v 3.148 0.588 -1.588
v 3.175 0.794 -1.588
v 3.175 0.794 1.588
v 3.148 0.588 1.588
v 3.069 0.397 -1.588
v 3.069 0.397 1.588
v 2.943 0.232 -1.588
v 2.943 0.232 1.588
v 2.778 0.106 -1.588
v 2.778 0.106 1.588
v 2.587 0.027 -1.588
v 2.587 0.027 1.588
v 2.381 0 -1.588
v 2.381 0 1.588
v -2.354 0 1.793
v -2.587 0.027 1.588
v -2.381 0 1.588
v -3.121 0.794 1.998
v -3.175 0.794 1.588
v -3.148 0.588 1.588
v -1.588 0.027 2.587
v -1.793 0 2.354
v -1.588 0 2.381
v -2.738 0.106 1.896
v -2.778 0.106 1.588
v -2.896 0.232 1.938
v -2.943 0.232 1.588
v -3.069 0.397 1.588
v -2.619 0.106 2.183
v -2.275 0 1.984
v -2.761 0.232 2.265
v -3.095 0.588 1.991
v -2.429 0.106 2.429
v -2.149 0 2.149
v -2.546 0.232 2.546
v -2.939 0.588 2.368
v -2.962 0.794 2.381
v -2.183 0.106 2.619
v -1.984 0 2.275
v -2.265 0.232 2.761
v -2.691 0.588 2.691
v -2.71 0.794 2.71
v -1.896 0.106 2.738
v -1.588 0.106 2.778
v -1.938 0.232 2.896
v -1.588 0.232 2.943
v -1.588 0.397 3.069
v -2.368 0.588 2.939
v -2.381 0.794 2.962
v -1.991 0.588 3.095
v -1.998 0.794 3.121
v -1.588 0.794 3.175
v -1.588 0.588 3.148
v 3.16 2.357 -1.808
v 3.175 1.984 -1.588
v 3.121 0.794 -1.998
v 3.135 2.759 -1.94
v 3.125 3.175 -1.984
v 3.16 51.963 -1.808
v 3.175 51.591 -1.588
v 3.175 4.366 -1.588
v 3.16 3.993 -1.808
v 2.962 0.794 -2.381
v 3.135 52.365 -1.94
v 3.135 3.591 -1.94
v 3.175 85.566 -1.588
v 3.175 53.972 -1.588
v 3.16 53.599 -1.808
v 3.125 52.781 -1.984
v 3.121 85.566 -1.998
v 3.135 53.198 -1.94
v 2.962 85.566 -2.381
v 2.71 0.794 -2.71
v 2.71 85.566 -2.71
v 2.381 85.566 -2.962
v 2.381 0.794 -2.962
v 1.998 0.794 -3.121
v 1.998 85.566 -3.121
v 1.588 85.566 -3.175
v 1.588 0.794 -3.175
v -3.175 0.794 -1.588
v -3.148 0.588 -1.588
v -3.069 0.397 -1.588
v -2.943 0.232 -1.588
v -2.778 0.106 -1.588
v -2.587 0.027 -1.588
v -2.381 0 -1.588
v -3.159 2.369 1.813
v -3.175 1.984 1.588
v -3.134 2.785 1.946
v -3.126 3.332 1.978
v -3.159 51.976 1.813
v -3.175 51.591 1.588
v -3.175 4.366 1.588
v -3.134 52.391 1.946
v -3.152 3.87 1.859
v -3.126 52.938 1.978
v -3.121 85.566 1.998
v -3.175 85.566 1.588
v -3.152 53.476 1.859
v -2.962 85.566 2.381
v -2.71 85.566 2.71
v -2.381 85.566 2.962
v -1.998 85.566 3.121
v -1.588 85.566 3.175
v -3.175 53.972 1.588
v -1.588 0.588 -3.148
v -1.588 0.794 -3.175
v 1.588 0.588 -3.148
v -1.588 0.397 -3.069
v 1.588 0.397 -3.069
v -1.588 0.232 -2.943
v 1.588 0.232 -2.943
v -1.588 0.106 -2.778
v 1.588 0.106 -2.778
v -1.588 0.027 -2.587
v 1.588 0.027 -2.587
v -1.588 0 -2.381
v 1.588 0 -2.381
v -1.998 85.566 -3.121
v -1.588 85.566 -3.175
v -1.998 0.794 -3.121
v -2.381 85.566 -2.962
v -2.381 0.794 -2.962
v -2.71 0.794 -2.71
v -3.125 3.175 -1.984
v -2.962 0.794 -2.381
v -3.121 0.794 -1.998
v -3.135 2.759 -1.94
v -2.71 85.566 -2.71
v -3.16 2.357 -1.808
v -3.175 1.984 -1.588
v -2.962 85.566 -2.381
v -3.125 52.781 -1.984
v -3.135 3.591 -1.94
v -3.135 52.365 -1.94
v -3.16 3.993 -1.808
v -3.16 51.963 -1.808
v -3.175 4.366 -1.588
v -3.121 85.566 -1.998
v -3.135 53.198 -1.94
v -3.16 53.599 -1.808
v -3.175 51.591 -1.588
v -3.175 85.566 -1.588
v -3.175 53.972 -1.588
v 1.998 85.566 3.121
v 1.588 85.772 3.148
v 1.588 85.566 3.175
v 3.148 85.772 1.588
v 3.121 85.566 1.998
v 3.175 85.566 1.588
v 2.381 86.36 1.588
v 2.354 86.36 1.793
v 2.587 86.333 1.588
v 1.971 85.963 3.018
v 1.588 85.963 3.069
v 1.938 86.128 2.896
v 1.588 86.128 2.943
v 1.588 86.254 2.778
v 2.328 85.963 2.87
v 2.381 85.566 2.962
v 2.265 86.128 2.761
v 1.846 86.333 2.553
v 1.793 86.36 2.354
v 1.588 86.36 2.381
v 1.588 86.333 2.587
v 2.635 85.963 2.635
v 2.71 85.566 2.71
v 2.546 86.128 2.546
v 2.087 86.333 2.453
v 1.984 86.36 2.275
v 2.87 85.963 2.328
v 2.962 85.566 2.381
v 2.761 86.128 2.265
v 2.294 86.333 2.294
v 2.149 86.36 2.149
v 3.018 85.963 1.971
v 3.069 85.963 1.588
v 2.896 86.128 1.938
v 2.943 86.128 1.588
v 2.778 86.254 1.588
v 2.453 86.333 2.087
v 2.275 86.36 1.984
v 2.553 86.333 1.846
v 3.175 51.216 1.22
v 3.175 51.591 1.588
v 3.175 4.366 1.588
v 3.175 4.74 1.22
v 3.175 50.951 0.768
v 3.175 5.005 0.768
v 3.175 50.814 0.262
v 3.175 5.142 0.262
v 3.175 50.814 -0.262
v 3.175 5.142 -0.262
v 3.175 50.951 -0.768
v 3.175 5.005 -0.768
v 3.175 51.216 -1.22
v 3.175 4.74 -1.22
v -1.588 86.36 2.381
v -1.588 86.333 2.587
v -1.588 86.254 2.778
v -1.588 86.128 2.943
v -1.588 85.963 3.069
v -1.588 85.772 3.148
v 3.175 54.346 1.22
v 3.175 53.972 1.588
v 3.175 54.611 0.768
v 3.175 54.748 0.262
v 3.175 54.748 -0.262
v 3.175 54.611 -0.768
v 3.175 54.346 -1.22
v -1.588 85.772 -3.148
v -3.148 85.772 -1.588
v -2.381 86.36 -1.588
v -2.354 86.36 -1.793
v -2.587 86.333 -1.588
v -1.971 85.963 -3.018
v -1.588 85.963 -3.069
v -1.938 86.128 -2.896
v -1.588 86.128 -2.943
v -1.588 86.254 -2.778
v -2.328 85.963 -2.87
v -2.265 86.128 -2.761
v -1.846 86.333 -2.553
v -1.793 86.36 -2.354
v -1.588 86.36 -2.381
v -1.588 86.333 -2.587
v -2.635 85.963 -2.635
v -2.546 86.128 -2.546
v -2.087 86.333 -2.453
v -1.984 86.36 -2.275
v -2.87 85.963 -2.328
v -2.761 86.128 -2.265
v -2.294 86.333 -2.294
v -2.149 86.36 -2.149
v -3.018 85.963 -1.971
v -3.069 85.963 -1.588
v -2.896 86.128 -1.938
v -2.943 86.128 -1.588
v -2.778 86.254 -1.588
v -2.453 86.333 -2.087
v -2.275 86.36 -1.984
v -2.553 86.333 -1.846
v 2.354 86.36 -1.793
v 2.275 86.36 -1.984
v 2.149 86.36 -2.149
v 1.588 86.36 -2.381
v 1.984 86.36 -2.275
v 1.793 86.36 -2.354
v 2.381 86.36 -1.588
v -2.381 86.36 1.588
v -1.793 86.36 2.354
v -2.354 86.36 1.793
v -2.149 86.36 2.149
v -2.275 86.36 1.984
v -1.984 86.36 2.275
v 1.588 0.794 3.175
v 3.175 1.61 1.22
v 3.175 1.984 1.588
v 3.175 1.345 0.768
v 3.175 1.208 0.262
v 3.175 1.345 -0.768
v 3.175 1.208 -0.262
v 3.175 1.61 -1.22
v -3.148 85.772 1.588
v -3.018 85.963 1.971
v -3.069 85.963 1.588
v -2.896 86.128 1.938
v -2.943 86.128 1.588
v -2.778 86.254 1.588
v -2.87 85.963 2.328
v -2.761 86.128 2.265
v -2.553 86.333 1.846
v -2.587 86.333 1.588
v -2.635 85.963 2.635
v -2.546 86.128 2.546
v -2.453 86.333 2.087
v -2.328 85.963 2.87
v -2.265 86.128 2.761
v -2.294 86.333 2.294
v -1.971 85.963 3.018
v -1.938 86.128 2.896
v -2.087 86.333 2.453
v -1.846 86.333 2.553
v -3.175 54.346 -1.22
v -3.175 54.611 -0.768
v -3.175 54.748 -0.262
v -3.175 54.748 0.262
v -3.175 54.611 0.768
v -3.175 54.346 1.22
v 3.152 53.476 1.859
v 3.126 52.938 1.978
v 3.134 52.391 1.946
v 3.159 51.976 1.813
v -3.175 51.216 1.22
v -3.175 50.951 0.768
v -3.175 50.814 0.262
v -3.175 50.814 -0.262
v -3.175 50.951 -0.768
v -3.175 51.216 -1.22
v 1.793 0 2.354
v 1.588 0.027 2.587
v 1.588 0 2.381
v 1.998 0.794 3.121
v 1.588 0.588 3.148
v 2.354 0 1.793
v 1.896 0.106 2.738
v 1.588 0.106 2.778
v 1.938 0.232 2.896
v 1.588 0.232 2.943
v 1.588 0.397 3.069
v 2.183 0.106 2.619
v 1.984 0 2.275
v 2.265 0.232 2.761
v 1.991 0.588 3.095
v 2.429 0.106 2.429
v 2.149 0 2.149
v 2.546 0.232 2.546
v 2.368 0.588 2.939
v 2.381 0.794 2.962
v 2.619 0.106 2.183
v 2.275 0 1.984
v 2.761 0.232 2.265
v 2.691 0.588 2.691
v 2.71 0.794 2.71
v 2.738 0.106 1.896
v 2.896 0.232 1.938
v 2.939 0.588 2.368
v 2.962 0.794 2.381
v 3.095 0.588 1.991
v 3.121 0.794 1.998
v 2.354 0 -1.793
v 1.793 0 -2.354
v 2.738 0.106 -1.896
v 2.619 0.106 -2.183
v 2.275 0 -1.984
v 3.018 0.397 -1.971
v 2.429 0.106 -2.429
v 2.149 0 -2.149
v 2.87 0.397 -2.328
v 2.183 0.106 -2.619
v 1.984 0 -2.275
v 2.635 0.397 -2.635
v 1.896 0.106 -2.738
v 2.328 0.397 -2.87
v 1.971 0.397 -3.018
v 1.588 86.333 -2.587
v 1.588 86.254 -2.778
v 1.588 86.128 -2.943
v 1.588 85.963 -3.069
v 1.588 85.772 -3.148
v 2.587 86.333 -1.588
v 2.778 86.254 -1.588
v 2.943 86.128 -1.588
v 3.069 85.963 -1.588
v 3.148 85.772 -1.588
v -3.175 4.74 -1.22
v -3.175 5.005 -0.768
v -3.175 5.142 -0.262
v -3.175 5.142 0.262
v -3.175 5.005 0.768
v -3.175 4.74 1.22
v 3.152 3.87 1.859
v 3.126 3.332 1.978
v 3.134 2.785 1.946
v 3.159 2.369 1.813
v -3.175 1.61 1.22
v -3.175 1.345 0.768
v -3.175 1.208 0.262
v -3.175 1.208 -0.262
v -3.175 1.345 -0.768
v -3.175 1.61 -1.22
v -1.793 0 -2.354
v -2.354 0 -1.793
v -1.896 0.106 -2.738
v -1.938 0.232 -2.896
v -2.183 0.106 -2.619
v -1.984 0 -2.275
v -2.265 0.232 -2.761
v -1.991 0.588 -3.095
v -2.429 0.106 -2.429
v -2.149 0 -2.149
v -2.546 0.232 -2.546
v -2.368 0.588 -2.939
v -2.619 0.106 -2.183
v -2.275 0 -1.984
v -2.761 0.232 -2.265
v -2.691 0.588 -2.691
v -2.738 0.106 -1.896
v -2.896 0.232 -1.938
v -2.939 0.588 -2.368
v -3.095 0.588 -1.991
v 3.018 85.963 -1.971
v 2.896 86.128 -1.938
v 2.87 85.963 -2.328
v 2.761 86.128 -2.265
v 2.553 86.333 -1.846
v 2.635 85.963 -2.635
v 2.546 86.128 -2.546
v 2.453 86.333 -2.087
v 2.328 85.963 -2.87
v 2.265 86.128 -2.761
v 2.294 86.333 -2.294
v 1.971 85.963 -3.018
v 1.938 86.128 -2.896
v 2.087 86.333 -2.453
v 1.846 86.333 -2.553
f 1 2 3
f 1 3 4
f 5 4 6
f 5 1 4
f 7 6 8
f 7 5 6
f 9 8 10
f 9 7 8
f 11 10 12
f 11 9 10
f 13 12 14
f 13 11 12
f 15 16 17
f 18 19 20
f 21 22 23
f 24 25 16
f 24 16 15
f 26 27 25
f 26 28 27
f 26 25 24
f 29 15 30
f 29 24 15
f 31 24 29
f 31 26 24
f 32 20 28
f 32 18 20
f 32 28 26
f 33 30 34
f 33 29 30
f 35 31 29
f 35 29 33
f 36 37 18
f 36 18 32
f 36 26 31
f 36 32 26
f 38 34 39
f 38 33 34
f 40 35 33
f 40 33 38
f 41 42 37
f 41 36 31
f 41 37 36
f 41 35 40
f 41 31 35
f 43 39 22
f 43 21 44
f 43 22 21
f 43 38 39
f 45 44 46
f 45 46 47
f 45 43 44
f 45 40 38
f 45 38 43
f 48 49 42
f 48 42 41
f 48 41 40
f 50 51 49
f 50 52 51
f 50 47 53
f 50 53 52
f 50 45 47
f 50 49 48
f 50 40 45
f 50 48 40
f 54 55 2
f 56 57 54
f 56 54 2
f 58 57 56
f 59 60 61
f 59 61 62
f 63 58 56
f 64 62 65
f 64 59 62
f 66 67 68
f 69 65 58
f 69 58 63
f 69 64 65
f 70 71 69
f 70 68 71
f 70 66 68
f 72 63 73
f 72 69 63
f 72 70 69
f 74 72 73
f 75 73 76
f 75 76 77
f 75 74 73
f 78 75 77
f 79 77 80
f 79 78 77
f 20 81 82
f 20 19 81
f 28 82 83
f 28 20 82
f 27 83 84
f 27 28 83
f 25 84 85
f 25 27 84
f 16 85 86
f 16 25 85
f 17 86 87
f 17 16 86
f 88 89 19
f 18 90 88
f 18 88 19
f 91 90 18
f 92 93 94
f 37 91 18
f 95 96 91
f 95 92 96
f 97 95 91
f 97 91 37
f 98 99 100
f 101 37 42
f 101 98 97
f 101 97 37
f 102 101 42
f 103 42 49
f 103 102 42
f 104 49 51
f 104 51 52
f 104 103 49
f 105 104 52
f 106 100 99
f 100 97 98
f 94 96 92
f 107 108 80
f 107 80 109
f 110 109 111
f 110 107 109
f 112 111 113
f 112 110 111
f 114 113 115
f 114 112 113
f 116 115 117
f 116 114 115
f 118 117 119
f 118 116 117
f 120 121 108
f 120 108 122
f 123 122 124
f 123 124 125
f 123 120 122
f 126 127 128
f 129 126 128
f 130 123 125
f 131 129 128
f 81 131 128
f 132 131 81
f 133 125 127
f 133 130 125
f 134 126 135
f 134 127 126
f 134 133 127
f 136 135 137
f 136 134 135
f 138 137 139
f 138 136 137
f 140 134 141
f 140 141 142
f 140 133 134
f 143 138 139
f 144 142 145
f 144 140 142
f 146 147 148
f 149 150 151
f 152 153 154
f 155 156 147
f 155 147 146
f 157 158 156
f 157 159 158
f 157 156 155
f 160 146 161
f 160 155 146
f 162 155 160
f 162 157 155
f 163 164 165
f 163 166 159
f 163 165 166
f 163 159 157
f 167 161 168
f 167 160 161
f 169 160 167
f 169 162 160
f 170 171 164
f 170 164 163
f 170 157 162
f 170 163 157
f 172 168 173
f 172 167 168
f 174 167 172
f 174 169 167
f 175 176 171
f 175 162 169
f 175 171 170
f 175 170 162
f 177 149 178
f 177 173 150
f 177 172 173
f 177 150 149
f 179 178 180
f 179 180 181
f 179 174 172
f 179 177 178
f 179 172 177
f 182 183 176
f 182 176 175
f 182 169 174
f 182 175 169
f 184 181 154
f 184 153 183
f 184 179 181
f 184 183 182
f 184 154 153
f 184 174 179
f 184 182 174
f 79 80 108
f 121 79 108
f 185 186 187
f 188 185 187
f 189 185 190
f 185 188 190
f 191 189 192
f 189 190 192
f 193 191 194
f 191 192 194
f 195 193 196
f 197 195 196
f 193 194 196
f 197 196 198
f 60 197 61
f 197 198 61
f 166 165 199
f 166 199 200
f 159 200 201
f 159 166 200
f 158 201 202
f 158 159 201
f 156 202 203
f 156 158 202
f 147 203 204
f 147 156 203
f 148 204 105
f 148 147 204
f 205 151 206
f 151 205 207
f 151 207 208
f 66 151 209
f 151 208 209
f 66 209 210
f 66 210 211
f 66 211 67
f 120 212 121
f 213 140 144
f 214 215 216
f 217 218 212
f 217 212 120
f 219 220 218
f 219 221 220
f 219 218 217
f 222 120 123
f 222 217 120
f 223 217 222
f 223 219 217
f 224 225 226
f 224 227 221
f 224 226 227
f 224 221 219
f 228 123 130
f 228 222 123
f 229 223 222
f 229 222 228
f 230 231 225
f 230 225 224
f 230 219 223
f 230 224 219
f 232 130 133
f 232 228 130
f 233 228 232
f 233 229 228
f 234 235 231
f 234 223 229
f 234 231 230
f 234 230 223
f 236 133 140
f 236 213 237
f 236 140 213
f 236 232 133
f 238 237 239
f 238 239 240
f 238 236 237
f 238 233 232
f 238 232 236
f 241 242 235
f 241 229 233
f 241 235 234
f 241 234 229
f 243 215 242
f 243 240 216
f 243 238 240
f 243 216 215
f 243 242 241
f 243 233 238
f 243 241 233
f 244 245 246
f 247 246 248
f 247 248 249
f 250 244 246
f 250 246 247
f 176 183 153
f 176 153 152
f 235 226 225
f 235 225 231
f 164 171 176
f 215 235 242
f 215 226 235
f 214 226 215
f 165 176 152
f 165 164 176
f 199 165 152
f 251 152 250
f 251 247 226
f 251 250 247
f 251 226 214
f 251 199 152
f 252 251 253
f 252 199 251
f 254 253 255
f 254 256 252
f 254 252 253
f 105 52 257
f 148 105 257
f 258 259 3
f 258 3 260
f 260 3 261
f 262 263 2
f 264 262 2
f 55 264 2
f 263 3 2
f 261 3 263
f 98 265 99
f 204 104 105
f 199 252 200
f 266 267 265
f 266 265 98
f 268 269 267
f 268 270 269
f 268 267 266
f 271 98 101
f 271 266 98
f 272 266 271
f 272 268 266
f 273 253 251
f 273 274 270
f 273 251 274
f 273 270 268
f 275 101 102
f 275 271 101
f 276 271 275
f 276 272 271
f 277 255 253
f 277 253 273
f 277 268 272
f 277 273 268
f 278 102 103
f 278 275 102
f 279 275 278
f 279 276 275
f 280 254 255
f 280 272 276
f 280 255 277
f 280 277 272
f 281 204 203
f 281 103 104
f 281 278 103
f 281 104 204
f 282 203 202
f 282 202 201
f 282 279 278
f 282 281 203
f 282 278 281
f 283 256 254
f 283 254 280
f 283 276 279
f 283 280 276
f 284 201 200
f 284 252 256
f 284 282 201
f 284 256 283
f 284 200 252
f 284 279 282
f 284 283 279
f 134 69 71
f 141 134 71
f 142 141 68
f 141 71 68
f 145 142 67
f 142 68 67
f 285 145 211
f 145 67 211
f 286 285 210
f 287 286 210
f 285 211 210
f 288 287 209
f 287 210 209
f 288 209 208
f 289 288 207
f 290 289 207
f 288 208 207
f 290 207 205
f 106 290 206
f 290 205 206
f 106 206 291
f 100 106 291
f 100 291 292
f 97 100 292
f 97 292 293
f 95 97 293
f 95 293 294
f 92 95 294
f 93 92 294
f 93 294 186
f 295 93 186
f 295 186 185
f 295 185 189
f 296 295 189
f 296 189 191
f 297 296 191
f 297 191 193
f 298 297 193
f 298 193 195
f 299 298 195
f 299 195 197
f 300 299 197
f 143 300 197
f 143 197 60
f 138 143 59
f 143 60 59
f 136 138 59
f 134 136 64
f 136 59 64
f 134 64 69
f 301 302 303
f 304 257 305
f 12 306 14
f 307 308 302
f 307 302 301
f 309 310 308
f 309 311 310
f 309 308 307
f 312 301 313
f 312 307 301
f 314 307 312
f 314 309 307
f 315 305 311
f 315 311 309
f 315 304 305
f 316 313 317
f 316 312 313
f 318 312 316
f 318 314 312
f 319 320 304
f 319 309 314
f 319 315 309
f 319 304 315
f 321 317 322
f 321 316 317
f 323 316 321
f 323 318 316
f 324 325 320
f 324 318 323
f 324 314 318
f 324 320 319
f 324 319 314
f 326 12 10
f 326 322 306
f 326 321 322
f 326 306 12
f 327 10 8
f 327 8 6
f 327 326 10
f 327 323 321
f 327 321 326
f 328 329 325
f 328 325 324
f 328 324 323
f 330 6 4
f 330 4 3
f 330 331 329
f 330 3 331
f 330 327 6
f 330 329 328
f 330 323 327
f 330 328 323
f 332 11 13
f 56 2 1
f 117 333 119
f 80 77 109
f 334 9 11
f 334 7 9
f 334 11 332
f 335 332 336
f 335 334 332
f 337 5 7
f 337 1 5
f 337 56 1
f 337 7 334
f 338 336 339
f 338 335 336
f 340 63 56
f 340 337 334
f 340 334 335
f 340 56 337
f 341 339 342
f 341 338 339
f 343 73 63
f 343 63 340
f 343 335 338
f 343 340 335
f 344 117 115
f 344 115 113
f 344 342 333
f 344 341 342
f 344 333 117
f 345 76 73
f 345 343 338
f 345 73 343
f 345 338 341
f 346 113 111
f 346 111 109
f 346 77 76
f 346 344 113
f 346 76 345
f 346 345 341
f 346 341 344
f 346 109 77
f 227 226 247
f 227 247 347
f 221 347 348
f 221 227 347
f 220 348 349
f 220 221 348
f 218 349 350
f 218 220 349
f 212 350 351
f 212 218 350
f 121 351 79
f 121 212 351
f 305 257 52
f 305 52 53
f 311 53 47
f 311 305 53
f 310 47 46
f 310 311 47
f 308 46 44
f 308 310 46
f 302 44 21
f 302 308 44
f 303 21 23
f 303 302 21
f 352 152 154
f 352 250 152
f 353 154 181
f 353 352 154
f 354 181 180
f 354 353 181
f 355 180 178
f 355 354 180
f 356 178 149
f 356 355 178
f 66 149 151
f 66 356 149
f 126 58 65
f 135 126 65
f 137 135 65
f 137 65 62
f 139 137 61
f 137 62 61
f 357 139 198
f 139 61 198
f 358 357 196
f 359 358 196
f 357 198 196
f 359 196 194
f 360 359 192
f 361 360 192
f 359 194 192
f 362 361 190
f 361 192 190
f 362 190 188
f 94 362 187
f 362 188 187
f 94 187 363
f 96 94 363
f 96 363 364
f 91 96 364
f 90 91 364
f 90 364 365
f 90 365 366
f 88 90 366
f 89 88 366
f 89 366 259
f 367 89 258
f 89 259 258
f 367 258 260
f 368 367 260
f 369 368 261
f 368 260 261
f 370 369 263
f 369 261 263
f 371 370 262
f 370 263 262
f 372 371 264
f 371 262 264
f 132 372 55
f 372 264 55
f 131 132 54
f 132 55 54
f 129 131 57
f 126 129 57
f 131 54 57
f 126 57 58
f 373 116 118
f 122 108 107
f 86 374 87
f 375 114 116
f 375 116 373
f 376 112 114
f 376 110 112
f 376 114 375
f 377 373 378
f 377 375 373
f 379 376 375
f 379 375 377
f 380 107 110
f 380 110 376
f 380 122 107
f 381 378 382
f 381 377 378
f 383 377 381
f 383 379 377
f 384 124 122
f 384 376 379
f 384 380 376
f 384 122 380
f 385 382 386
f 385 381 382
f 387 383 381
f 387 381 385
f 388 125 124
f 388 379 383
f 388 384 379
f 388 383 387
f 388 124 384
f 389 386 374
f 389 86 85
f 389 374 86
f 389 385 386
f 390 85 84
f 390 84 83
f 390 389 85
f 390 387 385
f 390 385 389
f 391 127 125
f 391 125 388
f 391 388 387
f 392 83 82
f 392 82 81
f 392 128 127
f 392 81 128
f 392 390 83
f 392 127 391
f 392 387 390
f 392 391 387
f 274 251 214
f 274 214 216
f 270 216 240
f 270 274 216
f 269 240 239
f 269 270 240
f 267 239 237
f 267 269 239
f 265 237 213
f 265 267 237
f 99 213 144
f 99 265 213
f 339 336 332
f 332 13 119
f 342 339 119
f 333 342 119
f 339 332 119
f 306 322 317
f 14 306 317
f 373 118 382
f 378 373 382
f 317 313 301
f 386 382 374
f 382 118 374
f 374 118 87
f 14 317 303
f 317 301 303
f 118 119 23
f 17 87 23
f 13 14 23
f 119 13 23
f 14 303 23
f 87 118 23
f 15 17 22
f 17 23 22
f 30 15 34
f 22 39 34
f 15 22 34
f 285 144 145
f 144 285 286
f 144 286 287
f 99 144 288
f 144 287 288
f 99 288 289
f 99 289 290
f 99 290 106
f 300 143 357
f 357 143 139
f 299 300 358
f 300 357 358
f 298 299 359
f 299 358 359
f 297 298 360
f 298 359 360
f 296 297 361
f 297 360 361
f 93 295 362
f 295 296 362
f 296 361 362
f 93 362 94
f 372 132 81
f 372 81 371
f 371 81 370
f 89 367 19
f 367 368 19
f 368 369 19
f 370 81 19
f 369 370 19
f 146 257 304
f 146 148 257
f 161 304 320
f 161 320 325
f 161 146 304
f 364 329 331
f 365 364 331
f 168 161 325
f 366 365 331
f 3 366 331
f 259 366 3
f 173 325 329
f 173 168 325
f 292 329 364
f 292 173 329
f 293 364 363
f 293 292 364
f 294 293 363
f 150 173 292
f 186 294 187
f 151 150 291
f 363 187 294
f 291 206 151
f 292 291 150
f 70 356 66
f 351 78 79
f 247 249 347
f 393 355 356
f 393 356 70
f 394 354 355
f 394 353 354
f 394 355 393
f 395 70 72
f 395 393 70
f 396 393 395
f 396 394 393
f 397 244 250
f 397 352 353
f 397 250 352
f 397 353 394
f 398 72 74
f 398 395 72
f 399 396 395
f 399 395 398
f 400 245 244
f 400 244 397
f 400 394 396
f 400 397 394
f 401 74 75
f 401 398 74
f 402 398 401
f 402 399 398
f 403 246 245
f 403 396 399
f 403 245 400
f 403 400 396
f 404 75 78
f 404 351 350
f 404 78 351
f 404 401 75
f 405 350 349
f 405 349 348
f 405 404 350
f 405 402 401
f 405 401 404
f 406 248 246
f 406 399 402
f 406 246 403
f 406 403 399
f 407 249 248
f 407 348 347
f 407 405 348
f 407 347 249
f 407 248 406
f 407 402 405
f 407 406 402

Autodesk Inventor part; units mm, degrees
ref_plane "YZ Plane" through (0, 0, 0) normal (1, 0, 0) x (0, 1, 0)
ref_plane "XZ Plane" through (0, 0, 0) normal (0, 1, 0) x (-1, 0, 0)
ref_plane "XY Plane" through (0, 0, 0) normal (0, 0, 1) x (1, 0, 0)
sketch "Sketch1" plane through (0, 0, 0) normal (0, 1, 0) x (-1, 0, 0)
  line L0 (-3.175, -3.175) -> (3.175, -3.175)
  line L1 (3.175, -3.175) -> (3.175, 3.175)
  line L2 (3.175, 3.175) -> (-3.175, 3.175)
  line L3 (-3.175, 3.175) -> (-3.175, -3.175)
  line L4 (-3.175, -3.175) -> (3.175, 3.175) construction
  line L5 (3.175, -3.175) -> (-3.175, 3.175) construction
  point P0 (0, 0)
  dimension "d0" = 6.35
  dimension "d1" = 6.35
extrude "Extrusion1" add sketch "Sketch1" along normal blind 86.36
fillet "Fillet1" radius 1.5875 4 edges at (3.175, 43.18, 3.175) (3.175, 43.18, -3.175) (-3.175, 43.18, -3.175) (-3.175, 43.18, 3.175)
fillet "Fillet2" radius 0.7937 16 edges at (2.71, 0, -2.71) (0, 0, -3.175) (-2.71, 0, -2.71) (-3.175, 0, 0) (-2.71, 0, 2.71) (0, 0, 3.175) (2.71, 0, 2.71) (3.175, 0, 0) (2.71, 86.36, -2.71) (0, 86.36, -3.175) (-2.71, 86.36, -2.71) (-3.175, 86.36, 0) (-2.71, 86.36, 2.71) (0, 86.36, 3.175) (2.71, 86.36, 2.71) (3.175, 86.36, 0)
sketch "Sketch2" plane through (3.175, 0.7937, 1.5875) normal (1, 0, 0) x (0, 0, -1)
  circle A0 centre (1.5875, 2.3813) radius 1.9844
  line L0 (0, -0.7937) -> (3.175, -0.7937) projected
  point P0 (1.5875, -0.7937)
  dimension "d6" = 3.9688
  dimension "d7" = 3.175
extrude "Extrusion2" cut sketch "Sketch2" against normal blind 88.9
sketch "Sketch3" plane through (3.175, 85.5662, 1.5875) normal (1, 0, 0) x (0, 0, -1)
  arc A0 (3.175, -81.2006) -> (0, -81.2006) centre (1.5875, -82.3912) ccw projected
  circle A1 centre (1.5875, -32.785) radius 1.9844
  point P0 (1.5875, -85.5662)
  dimension "d10" = 3.9688
  dimension "d11" = 49.6062
extrude "Extrusion3" cut sketch "Sketch3" against normal blind 88.9
properties part number "wedgeb" material "Stainless Steel"
